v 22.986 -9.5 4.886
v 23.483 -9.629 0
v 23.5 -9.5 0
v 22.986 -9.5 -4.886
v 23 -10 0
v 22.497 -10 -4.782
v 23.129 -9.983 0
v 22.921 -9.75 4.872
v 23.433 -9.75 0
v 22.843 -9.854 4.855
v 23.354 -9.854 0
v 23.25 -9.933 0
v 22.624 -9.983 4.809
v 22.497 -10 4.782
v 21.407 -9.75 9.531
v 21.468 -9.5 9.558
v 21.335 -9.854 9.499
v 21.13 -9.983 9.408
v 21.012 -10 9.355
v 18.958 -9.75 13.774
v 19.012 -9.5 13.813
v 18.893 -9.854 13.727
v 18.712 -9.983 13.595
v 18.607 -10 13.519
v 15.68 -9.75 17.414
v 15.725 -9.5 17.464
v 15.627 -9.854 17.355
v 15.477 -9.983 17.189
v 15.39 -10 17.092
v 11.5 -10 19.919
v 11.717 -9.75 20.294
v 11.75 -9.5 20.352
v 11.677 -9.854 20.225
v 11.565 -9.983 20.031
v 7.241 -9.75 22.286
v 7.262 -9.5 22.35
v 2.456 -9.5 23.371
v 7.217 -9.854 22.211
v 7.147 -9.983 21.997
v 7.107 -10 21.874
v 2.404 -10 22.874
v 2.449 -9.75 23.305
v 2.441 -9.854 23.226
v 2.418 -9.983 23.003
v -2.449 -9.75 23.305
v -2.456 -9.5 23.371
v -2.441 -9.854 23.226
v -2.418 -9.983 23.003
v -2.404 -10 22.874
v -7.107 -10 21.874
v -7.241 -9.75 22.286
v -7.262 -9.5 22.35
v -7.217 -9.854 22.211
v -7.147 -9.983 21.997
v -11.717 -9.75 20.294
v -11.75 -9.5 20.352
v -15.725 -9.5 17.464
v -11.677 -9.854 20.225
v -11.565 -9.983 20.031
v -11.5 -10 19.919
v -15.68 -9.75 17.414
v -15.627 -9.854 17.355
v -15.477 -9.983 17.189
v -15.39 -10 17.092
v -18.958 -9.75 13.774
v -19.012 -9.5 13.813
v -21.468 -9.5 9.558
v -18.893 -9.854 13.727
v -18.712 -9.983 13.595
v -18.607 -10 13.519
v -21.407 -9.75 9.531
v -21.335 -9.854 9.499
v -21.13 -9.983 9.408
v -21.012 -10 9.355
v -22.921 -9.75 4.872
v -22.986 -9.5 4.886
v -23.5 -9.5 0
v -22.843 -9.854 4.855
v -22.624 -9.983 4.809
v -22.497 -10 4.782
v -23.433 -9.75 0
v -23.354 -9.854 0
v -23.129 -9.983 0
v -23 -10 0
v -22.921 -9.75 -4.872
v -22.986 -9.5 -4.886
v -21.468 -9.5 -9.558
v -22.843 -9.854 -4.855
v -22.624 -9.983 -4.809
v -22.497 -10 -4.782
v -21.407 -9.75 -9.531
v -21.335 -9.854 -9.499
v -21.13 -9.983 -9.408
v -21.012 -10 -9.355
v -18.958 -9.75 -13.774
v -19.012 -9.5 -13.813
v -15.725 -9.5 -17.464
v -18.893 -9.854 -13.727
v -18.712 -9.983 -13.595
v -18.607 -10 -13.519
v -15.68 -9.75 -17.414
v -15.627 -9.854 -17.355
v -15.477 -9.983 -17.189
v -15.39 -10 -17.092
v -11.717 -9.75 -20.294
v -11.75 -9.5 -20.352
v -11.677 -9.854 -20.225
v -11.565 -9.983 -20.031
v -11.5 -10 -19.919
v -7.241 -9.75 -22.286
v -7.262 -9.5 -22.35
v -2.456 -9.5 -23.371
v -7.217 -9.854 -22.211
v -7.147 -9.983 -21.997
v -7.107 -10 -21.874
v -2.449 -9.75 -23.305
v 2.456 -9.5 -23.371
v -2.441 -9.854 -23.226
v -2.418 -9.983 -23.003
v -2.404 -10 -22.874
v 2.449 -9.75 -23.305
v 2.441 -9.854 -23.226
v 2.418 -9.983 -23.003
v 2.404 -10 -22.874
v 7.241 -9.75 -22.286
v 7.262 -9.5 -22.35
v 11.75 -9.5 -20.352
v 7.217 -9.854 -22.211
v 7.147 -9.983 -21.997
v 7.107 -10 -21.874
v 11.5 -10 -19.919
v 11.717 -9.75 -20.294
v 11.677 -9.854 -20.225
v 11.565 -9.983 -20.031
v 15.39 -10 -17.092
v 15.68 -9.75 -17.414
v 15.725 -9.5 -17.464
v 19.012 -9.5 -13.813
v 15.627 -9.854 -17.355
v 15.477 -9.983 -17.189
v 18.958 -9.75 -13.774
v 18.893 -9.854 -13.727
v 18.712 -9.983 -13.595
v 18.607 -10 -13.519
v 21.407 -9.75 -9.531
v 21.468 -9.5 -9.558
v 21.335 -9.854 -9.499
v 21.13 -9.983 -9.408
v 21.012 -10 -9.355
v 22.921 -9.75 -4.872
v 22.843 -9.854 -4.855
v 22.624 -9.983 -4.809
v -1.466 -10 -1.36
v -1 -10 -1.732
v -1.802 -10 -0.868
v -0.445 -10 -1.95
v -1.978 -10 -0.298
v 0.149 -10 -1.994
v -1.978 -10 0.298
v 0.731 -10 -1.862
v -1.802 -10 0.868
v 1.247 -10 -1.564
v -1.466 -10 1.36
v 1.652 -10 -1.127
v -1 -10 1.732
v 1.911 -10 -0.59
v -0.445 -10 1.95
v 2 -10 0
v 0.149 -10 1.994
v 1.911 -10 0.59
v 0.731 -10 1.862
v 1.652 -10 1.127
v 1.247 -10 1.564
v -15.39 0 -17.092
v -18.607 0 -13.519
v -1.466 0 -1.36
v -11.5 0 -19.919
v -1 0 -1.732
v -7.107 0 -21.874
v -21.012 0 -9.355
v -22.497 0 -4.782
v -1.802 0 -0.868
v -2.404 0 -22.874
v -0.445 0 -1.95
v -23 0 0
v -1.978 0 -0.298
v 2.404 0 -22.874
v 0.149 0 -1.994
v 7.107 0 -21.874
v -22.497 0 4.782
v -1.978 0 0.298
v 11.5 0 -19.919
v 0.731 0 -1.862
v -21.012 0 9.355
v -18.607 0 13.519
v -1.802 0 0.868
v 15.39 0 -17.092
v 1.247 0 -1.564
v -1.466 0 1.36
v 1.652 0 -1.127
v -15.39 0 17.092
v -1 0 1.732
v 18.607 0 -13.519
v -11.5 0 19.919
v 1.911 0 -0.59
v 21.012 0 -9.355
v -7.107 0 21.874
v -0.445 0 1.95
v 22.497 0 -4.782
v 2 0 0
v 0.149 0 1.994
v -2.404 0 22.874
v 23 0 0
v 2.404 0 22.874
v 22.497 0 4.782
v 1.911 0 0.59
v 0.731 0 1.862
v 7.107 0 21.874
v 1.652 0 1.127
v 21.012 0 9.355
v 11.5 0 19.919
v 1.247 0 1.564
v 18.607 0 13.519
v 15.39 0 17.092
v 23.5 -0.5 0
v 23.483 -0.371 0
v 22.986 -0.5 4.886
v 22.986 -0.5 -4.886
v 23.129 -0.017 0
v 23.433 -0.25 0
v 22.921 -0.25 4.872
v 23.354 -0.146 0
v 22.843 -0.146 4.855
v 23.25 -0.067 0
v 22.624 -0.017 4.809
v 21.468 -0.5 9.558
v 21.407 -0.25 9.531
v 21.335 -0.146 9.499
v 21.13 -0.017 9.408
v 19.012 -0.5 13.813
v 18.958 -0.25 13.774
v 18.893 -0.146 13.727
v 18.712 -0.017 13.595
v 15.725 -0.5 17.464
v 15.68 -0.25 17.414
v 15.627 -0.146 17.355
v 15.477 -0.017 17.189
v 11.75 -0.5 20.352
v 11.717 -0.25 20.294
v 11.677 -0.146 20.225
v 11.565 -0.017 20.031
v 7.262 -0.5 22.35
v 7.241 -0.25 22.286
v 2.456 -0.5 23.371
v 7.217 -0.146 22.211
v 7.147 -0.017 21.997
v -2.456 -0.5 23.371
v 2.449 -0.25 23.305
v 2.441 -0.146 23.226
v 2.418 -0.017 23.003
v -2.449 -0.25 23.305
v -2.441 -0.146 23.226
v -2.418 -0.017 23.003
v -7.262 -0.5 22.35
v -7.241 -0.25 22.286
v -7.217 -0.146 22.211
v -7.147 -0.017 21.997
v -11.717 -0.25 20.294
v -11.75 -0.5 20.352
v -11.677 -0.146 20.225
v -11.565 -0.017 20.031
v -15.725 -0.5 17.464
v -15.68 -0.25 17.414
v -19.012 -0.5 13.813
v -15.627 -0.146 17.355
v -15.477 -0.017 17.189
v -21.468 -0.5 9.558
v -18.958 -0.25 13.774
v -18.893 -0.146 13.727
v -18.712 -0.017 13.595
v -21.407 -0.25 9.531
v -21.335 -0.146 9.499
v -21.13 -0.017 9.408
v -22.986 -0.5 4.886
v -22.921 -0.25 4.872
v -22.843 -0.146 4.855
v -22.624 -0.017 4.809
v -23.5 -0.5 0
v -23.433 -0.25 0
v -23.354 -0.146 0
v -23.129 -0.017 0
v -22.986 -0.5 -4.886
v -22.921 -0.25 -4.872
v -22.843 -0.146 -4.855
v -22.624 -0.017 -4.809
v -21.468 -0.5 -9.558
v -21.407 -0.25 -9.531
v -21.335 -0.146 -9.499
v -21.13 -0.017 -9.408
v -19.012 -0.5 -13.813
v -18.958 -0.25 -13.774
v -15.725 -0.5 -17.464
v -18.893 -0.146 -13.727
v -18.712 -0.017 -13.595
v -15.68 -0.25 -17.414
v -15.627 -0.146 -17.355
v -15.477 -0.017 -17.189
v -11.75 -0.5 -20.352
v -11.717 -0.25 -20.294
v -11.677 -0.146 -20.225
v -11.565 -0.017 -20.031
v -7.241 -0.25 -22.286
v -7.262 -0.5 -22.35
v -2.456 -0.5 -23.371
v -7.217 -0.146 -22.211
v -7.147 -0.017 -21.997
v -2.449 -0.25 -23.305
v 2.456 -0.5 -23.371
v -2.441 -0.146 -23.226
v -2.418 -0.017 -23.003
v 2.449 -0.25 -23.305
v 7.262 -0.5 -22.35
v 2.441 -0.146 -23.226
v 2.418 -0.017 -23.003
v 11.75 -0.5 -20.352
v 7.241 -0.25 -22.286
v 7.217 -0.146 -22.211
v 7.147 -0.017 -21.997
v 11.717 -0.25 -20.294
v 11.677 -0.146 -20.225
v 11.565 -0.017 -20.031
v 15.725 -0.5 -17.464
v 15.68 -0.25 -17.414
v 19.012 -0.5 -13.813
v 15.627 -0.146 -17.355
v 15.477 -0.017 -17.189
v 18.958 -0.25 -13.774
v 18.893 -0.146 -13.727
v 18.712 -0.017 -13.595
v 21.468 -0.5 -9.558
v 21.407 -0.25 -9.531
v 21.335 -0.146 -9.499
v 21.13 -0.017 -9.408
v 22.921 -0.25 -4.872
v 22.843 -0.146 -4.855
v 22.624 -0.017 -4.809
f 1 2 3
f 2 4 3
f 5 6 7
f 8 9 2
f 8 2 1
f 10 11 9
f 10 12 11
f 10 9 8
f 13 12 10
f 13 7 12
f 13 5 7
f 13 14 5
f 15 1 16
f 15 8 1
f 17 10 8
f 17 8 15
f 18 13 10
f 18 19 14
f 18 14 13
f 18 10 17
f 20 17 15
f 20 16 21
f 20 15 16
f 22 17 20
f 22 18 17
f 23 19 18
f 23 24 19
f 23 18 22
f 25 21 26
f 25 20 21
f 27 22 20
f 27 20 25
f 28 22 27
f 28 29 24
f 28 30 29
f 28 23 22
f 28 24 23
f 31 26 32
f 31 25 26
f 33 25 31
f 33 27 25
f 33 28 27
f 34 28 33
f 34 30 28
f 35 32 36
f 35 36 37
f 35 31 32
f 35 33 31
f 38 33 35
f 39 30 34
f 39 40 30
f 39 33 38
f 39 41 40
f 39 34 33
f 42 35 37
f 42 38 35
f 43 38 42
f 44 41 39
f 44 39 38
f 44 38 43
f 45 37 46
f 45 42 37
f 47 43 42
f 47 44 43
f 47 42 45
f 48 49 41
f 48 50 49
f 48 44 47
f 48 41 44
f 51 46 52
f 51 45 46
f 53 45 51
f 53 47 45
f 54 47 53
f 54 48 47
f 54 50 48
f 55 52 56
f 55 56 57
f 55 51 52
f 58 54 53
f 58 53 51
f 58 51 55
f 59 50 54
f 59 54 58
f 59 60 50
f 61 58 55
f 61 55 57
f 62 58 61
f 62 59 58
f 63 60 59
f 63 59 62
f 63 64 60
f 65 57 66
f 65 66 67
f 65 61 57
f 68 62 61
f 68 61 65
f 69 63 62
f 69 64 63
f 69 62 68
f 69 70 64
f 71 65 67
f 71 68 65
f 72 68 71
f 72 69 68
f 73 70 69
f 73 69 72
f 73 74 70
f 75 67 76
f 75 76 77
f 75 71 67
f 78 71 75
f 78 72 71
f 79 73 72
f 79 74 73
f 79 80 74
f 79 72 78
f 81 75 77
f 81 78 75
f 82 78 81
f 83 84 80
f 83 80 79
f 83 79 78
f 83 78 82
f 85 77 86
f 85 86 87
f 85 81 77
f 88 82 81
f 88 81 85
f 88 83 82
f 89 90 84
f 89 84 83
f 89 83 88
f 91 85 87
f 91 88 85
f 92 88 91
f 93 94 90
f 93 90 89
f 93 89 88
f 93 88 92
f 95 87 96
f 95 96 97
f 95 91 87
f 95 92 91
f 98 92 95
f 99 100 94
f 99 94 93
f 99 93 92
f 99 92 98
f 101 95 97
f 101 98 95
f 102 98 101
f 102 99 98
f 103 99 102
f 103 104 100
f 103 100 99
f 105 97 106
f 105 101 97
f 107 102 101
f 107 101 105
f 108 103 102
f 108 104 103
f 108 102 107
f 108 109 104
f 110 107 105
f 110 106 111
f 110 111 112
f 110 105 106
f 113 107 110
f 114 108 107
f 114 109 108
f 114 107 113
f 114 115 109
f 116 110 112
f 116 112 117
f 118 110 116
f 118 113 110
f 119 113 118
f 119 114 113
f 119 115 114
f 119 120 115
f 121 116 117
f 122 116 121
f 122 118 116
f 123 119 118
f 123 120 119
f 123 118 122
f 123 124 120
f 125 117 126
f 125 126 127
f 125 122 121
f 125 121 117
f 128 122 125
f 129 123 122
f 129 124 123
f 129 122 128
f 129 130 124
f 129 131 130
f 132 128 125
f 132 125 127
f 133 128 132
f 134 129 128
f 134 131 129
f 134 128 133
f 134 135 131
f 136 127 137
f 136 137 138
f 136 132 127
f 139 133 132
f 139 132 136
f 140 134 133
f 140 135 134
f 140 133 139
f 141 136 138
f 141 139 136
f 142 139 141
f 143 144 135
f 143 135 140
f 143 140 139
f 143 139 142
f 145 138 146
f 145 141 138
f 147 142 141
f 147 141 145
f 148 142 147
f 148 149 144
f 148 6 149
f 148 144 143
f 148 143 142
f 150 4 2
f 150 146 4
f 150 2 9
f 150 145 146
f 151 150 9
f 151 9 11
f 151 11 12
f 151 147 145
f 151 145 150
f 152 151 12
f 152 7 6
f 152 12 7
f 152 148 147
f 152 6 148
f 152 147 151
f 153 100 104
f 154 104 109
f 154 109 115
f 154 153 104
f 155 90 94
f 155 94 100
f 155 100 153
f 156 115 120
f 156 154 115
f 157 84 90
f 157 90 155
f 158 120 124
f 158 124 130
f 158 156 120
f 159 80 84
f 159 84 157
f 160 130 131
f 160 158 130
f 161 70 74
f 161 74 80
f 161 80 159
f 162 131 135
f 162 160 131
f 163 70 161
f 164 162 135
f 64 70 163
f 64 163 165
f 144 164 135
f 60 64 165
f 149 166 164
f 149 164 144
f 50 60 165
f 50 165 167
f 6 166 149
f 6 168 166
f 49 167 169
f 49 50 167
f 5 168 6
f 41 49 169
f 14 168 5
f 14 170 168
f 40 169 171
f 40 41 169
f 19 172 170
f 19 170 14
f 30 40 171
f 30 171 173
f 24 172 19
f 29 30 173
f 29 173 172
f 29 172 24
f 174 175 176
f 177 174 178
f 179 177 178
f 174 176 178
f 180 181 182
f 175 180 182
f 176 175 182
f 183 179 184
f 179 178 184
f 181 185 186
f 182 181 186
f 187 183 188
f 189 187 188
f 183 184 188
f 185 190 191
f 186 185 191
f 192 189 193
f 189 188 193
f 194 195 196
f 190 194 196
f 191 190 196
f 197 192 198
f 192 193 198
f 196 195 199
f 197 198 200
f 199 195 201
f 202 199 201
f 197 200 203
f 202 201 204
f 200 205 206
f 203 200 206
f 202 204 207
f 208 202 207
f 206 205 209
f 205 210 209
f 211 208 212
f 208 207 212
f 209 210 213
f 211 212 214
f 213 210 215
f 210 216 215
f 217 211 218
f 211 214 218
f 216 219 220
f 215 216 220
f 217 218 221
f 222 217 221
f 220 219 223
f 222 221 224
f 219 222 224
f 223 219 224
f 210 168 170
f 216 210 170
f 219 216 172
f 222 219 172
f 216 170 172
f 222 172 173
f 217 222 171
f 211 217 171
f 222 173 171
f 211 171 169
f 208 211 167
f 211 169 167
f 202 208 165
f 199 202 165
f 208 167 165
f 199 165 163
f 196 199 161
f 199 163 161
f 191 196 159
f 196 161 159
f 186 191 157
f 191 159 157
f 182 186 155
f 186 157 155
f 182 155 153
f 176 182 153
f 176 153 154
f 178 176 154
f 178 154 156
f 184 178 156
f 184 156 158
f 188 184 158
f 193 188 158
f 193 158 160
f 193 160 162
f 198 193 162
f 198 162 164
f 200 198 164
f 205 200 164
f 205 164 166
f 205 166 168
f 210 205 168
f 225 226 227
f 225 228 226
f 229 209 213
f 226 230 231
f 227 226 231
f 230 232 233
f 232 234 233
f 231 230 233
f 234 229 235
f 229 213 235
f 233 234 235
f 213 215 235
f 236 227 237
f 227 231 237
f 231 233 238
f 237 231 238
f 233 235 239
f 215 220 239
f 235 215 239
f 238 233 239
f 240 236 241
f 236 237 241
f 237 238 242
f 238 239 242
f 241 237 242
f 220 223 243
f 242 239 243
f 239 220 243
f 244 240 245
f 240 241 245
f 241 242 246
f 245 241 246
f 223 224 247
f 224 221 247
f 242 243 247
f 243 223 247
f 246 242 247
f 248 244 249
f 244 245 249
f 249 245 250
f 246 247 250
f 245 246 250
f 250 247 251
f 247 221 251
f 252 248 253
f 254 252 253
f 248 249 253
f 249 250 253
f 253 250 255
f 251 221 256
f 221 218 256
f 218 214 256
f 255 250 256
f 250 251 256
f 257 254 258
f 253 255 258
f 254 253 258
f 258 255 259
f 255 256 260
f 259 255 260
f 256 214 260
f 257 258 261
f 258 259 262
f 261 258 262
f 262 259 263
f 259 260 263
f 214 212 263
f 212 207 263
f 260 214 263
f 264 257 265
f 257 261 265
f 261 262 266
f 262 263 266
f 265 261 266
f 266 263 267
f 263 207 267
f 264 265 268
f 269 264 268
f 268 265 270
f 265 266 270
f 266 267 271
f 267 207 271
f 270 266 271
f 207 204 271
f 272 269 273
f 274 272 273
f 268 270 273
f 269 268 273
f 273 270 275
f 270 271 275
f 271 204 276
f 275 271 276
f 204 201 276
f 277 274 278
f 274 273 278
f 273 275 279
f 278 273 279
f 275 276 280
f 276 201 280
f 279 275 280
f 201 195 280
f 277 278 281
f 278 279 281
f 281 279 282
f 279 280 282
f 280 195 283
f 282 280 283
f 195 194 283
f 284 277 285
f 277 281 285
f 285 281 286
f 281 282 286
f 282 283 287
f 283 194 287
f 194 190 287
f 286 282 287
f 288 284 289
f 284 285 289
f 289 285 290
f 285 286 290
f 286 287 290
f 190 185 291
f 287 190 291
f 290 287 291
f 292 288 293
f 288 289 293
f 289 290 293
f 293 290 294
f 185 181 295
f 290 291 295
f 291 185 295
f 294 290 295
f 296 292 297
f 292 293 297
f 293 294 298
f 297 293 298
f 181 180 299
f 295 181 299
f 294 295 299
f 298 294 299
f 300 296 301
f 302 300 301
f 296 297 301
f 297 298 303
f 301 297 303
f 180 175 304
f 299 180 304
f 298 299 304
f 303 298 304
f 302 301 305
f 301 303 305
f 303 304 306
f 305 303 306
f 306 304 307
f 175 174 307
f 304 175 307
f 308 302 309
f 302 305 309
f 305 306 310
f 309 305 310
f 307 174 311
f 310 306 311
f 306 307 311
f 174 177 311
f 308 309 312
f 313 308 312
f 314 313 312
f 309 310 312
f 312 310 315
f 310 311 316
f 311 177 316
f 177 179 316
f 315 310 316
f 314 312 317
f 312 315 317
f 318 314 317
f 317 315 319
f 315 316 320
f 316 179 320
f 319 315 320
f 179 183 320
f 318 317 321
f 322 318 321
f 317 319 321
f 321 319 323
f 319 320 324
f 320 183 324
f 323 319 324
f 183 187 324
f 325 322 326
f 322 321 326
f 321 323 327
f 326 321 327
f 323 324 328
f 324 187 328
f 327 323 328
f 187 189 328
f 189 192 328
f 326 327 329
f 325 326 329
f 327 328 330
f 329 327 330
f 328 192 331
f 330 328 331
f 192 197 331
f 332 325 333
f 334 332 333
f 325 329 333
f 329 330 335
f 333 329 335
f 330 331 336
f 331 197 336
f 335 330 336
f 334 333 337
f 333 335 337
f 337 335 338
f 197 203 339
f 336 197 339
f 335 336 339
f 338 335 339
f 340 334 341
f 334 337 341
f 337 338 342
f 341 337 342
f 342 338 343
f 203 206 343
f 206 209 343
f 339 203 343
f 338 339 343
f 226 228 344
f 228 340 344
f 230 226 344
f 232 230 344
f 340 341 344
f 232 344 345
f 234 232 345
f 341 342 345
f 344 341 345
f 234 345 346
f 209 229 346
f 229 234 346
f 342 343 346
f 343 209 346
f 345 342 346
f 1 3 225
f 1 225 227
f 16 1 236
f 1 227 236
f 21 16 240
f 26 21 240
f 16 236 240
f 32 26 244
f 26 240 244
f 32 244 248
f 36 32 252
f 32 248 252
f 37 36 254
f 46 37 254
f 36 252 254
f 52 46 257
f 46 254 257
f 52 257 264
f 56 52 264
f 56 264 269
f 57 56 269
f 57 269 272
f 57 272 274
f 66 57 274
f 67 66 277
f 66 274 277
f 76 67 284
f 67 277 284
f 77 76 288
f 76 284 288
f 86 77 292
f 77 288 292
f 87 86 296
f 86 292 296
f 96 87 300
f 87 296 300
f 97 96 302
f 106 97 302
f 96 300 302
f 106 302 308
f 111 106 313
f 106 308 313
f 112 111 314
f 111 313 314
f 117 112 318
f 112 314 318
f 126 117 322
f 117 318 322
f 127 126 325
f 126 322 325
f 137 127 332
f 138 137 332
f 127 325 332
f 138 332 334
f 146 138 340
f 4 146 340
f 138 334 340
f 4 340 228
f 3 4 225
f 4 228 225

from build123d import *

# Parameters (mm, degrees)
F0_R     = 23.5
F1_DEPTH = 10
F2_R     = 2
F3_DEPTH = 25.4
F4_R     = 0.5


with BuildPart() as f1:
    # F0 (on Front) → F1 (new body)
    with BuildSketch(Plane.XZ):
        Circle(F0_R)
    extrude(amount=F1_DEPTH)

    # F2 (on face) → F3 (cut)
    with BuildSketch(Plane.XZ.offset(10)):
        Circle(F2_R)
    extrude(amount=-F3_DEPTH, mode=Mode.SUBTRACT)

    # F4
    f4_edges = [f1.edges().sort_by_distance(p)[0] for p in [
        (-23.5, -10, 0),
        (-23.5, 0, 0),
    ]]
    fillet(f4_edges, radius=F4_R)


solid = f1.part
